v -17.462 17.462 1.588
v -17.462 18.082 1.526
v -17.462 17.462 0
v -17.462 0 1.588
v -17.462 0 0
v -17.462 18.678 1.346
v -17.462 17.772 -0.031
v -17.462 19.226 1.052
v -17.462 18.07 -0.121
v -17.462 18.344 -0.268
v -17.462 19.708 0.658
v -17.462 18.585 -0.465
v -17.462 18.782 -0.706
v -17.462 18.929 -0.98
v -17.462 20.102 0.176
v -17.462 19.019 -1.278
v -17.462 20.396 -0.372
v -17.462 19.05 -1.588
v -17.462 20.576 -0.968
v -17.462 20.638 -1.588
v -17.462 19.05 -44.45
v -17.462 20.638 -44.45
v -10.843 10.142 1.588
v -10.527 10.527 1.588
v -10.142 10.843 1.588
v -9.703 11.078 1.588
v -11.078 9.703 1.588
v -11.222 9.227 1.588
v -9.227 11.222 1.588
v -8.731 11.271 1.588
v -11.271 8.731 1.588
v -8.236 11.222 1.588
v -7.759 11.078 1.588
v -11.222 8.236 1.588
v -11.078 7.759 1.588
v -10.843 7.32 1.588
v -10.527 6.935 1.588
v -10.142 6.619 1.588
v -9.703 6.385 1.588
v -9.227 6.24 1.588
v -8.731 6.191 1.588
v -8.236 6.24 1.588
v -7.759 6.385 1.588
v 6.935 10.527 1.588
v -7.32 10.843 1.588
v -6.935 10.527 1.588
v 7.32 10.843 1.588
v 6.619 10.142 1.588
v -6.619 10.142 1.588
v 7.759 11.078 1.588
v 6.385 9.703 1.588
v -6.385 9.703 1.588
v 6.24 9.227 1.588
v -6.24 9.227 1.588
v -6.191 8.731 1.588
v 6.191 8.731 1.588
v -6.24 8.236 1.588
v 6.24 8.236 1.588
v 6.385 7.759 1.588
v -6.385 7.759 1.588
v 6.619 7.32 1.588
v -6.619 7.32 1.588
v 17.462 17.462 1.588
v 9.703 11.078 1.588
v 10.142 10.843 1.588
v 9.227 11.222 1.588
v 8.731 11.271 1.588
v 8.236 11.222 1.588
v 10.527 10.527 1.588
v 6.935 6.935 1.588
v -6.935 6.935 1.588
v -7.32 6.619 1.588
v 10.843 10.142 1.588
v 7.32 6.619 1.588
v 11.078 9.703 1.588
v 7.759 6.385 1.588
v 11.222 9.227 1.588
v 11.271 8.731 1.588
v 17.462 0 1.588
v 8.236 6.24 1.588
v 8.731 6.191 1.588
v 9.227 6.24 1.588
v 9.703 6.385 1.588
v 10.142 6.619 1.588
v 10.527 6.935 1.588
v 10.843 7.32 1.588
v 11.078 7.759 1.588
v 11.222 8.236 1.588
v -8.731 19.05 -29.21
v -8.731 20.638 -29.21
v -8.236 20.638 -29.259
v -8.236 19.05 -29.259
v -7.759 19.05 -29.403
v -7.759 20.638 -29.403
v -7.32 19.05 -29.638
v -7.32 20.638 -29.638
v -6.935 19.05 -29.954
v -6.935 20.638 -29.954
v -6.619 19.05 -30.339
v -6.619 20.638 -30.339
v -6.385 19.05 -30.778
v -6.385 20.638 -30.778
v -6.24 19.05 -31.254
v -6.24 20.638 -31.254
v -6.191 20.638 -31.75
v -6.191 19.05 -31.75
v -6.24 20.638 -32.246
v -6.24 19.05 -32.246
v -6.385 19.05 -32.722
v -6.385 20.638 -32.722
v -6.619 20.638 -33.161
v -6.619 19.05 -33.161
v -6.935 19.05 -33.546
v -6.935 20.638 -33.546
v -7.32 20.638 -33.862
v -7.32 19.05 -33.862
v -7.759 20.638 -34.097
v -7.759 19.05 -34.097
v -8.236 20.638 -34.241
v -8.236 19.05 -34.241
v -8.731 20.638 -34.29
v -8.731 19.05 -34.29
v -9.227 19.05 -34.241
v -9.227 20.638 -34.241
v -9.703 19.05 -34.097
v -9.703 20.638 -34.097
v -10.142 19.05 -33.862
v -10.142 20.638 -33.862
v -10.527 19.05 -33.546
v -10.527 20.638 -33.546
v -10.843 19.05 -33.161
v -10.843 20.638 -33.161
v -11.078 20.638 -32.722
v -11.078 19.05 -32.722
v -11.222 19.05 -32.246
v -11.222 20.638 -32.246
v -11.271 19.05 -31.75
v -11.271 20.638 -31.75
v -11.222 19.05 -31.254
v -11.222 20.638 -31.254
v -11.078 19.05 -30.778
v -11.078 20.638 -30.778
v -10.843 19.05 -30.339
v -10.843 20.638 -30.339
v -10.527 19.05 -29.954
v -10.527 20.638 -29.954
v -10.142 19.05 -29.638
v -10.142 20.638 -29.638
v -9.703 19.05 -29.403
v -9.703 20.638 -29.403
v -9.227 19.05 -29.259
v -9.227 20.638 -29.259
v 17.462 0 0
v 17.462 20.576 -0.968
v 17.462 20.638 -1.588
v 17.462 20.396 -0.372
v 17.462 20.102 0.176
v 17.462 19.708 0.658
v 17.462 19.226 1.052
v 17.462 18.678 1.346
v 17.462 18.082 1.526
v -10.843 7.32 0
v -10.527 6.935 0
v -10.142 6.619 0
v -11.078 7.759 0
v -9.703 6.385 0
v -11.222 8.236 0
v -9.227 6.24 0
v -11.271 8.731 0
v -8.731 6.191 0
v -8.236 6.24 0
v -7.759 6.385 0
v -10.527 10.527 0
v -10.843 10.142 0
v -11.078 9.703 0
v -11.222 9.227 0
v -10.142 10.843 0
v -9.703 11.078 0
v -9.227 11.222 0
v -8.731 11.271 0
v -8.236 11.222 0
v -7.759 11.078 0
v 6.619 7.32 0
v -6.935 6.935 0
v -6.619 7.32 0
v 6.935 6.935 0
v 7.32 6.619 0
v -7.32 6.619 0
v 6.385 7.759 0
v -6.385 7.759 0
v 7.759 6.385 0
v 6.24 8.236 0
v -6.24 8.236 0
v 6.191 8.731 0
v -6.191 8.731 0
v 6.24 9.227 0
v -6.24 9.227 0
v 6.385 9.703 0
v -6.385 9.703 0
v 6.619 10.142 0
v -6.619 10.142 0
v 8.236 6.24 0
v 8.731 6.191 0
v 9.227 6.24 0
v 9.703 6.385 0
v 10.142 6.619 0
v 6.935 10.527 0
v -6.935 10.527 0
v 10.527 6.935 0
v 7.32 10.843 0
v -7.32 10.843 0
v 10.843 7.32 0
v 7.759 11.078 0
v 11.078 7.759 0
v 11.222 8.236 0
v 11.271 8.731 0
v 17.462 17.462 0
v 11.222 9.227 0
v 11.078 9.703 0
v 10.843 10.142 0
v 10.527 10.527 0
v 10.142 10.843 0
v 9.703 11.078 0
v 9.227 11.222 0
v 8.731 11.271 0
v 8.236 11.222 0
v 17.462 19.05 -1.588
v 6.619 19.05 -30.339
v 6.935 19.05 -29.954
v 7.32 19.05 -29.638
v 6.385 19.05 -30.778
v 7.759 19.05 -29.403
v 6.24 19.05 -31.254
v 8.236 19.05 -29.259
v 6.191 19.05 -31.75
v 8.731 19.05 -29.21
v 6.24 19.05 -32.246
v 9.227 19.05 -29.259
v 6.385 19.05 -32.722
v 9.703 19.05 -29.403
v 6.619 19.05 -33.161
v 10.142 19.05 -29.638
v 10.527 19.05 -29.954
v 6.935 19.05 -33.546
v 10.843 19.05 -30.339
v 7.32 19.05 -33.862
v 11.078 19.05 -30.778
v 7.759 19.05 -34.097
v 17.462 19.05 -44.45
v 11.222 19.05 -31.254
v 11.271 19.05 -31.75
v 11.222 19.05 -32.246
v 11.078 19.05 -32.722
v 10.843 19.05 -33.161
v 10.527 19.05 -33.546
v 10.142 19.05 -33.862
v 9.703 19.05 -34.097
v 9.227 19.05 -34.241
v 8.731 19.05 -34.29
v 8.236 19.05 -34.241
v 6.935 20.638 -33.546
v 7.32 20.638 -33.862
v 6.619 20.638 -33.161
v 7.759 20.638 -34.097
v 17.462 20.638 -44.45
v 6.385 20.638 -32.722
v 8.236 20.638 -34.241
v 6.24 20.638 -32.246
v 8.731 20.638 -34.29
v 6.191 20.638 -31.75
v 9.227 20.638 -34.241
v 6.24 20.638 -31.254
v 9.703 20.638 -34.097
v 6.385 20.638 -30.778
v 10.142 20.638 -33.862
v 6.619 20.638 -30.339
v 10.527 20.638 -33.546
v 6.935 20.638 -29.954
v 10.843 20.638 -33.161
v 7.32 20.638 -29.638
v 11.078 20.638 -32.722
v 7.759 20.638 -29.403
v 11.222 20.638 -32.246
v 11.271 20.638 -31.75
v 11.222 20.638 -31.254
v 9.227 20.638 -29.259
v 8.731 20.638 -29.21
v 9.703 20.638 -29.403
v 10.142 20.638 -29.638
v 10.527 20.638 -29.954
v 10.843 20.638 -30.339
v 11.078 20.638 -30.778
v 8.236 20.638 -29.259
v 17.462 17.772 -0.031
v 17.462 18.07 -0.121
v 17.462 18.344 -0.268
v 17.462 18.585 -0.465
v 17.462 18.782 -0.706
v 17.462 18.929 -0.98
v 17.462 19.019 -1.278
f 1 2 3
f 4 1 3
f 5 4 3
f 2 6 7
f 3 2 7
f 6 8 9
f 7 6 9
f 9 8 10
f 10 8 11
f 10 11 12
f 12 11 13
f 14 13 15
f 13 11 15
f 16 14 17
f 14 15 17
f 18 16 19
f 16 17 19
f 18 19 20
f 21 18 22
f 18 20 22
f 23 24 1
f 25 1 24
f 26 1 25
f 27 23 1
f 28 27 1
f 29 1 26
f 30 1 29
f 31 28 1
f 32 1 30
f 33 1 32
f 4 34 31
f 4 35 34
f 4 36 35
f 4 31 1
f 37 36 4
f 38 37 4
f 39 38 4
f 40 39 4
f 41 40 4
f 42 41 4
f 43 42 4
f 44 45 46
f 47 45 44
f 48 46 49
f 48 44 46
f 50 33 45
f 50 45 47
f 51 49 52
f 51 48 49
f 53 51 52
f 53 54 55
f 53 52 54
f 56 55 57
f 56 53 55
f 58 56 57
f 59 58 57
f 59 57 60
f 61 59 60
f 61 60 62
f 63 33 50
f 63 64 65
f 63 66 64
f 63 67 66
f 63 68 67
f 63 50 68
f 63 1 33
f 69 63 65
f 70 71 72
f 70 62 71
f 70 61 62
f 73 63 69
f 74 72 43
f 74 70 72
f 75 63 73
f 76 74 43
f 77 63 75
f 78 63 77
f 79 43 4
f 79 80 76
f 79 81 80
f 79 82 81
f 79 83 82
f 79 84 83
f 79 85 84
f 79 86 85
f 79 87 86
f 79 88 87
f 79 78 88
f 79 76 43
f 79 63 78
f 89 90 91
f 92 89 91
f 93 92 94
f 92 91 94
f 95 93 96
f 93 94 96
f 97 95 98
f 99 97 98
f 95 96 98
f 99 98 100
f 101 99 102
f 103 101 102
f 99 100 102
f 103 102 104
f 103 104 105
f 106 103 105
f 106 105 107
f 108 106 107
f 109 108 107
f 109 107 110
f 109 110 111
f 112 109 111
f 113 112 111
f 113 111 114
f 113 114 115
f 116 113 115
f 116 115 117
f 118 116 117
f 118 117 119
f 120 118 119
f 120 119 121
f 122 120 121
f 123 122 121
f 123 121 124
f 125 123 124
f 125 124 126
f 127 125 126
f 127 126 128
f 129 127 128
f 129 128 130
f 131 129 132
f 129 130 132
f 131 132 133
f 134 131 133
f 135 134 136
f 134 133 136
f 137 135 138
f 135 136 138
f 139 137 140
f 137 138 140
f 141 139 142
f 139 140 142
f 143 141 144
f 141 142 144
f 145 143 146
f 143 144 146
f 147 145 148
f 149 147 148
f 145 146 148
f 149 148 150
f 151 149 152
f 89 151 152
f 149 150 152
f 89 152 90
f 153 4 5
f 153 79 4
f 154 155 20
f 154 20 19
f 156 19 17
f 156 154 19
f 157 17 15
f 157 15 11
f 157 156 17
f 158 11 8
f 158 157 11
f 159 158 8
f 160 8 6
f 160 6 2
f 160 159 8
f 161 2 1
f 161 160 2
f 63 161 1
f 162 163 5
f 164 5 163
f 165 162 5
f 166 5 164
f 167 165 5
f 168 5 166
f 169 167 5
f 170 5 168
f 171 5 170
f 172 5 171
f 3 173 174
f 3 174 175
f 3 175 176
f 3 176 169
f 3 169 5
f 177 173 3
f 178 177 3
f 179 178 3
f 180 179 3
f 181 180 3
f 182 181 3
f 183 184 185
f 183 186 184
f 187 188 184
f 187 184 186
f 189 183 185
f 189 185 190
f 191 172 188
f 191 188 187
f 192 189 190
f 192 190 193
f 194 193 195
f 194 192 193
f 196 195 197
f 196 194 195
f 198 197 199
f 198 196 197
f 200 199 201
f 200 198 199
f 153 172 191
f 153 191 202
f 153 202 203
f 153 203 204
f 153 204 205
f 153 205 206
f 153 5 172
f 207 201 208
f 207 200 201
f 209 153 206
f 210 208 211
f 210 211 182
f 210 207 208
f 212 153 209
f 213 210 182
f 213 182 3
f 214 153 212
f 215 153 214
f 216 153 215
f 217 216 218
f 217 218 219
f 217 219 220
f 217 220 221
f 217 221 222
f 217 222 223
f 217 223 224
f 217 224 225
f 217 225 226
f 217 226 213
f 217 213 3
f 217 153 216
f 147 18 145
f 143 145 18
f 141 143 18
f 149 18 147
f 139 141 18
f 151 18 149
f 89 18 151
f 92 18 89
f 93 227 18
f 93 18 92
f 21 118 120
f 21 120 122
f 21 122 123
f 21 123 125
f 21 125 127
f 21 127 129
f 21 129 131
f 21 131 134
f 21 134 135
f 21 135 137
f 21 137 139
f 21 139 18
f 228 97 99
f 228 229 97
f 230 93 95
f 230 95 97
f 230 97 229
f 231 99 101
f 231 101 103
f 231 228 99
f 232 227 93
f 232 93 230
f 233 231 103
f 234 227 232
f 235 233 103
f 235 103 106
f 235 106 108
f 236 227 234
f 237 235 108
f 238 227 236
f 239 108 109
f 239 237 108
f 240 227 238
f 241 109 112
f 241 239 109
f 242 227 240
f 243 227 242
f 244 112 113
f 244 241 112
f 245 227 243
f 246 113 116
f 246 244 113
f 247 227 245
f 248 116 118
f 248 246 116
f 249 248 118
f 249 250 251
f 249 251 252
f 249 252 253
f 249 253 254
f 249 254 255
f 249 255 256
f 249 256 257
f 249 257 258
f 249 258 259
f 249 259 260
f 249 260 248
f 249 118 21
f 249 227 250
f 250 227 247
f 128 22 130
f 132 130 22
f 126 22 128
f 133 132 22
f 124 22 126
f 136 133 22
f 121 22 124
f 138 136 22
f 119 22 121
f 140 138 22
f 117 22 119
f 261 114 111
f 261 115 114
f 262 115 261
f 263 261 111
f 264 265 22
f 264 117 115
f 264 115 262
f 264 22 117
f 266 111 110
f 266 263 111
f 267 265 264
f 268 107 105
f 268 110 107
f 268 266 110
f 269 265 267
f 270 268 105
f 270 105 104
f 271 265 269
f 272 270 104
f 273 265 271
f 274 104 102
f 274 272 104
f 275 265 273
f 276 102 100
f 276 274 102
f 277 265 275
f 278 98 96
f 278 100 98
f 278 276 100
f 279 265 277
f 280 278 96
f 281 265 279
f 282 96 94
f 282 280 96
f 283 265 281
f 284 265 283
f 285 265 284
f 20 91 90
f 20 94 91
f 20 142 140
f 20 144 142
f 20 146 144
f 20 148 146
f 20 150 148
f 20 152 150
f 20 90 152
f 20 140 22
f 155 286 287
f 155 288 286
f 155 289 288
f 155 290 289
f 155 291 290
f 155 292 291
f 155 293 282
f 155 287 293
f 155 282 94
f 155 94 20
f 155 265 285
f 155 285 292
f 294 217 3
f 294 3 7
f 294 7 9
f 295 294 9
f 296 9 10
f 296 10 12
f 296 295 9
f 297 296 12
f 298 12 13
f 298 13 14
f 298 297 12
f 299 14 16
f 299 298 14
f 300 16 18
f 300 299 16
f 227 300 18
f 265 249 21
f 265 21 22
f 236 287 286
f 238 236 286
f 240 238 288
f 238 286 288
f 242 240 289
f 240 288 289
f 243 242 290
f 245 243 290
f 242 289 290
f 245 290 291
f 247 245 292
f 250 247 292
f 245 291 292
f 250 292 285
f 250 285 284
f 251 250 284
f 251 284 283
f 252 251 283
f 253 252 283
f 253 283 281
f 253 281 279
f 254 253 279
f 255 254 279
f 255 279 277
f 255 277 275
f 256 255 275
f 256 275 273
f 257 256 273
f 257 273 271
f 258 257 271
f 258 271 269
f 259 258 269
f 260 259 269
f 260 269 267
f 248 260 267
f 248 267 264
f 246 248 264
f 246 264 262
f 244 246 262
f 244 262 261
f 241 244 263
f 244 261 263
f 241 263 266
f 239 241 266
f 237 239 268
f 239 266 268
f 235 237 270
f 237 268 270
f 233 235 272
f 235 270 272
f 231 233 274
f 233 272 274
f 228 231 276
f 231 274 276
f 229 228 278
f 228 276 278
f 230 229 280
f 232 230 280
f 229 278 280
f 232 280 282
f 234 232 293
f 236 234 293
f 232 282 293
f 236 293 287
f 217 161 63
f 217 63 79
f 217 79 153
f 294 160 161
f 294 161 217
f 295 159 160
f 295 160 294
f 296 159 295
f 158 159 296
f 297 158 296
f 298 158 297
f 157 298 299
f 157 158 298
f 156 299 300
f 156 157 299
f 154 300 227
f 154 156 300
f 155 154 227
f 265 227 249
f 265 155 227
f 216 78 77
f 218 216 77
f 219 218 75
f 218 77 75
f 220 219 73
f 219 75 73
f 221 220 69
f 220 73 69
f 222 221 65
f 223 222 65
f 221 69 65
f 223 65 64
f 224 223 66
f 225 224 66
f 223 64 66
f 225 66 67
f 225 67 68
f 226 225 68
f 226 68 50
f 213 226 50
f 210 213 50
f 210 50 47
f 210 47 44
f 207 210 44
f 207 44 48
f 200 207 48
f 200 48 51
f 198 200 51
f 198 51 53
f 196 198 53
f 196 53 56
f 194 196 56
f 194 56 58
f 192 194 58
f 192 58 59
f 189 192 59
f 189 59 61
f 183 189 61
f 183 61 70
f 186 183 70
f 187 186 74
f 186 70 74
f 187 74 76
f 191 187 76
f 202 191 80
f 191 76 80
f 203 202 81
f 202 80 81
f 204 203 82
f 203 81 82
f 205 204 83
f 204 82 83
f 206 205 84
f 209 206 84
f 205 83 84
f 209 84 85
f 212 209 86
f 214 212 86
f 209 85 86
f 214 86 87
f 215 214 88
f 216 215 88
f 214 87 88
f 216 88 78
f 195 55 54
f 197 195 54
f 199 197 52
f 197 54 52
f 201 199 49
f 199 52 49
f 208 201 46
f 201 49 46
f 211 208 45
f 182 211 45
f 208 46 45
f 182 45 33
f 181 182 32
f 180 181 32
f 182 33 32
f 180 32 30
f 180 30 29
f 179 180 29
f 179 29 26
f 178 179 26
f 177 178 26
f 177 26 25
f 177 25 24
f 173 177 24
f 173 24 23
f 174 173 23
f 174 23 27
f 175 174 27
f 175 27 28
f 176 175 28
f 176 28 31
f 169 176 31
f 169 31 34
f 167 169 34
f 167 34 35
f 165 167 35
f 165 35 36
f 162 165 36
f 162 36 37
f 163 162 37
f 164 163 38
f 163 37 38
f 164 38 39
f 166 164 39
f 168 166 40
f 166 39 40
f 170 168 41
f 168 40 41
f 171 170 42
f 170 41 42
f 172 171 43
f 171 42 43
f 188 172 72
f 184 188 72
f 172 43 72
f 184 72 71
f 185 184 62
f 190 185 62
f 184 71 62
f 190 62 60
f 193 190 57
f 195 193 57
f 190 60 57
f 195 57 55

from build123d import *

# Parameters (mm, degrees)
BASE_FLANGE1_DEPTH = 17.4625
SKETCH6_R          = 2.54
CUT_EXTRUDE1_DEPTH = 2.54
SKETCH7_R          = 2.54
CUT_EXTRUDE2_DEPTH = 2.54


# Sheet-metal steps are written as plain solids
with BuildPart() as part:
    # Sketch1 → Base-Flange1 (new, symmetric)
    with BuildSketch(Plane(origin=(0, 0, 0), x_dir=(0, 0, -1), z_dir=(1, 0, 0))):
        with BuildLine():
            Line((0, 0), (0, 17.4625))
            ThreePointArc((0, 17.4625), (0.464967985, 18.585032015), (1.5875, 19.05))
            Line((1.5875, 19.05), (44.45, 19.05))
            Line((44.45, 19.05), (44.45, 20.6375))
            Line((44.45, 20.6375), (1.5875, 20.6375))
            ThreePointArc((1.5875, 20.6375), (-0.65756403, 19.70756403), (-1.5875, 17.4625))
            Line((-1.5875, 17.4625), (-1.5875, 0))
            Line((-1.5875, 0), (0, 0))
        make_face()
    extrude(amount=BASE_FLANGE1_DEPTH, both=True)

    # Sketch6 → Cut-Extrude1 (cut)
    with BuildSketch(Plane.XY.offset(1.5875)):
        with Locations((-8.73125, 8.73125)):
            Circle(SKETCH6_R)
        with Locations((8.73125, 8.73125)):
            Circle(SKETCH6_R)
    extrude(amount=-CUT_EXTRUDE1_DEPTH, mode=Mode.SUBTRACT)

    # Sketch7 → Cut-Extrude2 (cut)
    with BuildSketch(Plane(origin=(0, 20.6375, 0), x_dir=(1, 0, 0), z_dir=(0, 1, 0))):
        with Locations(Location((-8.73125, 31.75, 0), (0, 0, 270))):
            Circle(SKETCH7_R)
        with Locations(Location((8.73125, 31.75, 0), (0, 0, 270))):
            Circle(SKETCH7_R)
    extrude(amount=-CUT_EXTRUDE2_DEPTH, mode=Mode.SUBTRACT)


solid = part.part
